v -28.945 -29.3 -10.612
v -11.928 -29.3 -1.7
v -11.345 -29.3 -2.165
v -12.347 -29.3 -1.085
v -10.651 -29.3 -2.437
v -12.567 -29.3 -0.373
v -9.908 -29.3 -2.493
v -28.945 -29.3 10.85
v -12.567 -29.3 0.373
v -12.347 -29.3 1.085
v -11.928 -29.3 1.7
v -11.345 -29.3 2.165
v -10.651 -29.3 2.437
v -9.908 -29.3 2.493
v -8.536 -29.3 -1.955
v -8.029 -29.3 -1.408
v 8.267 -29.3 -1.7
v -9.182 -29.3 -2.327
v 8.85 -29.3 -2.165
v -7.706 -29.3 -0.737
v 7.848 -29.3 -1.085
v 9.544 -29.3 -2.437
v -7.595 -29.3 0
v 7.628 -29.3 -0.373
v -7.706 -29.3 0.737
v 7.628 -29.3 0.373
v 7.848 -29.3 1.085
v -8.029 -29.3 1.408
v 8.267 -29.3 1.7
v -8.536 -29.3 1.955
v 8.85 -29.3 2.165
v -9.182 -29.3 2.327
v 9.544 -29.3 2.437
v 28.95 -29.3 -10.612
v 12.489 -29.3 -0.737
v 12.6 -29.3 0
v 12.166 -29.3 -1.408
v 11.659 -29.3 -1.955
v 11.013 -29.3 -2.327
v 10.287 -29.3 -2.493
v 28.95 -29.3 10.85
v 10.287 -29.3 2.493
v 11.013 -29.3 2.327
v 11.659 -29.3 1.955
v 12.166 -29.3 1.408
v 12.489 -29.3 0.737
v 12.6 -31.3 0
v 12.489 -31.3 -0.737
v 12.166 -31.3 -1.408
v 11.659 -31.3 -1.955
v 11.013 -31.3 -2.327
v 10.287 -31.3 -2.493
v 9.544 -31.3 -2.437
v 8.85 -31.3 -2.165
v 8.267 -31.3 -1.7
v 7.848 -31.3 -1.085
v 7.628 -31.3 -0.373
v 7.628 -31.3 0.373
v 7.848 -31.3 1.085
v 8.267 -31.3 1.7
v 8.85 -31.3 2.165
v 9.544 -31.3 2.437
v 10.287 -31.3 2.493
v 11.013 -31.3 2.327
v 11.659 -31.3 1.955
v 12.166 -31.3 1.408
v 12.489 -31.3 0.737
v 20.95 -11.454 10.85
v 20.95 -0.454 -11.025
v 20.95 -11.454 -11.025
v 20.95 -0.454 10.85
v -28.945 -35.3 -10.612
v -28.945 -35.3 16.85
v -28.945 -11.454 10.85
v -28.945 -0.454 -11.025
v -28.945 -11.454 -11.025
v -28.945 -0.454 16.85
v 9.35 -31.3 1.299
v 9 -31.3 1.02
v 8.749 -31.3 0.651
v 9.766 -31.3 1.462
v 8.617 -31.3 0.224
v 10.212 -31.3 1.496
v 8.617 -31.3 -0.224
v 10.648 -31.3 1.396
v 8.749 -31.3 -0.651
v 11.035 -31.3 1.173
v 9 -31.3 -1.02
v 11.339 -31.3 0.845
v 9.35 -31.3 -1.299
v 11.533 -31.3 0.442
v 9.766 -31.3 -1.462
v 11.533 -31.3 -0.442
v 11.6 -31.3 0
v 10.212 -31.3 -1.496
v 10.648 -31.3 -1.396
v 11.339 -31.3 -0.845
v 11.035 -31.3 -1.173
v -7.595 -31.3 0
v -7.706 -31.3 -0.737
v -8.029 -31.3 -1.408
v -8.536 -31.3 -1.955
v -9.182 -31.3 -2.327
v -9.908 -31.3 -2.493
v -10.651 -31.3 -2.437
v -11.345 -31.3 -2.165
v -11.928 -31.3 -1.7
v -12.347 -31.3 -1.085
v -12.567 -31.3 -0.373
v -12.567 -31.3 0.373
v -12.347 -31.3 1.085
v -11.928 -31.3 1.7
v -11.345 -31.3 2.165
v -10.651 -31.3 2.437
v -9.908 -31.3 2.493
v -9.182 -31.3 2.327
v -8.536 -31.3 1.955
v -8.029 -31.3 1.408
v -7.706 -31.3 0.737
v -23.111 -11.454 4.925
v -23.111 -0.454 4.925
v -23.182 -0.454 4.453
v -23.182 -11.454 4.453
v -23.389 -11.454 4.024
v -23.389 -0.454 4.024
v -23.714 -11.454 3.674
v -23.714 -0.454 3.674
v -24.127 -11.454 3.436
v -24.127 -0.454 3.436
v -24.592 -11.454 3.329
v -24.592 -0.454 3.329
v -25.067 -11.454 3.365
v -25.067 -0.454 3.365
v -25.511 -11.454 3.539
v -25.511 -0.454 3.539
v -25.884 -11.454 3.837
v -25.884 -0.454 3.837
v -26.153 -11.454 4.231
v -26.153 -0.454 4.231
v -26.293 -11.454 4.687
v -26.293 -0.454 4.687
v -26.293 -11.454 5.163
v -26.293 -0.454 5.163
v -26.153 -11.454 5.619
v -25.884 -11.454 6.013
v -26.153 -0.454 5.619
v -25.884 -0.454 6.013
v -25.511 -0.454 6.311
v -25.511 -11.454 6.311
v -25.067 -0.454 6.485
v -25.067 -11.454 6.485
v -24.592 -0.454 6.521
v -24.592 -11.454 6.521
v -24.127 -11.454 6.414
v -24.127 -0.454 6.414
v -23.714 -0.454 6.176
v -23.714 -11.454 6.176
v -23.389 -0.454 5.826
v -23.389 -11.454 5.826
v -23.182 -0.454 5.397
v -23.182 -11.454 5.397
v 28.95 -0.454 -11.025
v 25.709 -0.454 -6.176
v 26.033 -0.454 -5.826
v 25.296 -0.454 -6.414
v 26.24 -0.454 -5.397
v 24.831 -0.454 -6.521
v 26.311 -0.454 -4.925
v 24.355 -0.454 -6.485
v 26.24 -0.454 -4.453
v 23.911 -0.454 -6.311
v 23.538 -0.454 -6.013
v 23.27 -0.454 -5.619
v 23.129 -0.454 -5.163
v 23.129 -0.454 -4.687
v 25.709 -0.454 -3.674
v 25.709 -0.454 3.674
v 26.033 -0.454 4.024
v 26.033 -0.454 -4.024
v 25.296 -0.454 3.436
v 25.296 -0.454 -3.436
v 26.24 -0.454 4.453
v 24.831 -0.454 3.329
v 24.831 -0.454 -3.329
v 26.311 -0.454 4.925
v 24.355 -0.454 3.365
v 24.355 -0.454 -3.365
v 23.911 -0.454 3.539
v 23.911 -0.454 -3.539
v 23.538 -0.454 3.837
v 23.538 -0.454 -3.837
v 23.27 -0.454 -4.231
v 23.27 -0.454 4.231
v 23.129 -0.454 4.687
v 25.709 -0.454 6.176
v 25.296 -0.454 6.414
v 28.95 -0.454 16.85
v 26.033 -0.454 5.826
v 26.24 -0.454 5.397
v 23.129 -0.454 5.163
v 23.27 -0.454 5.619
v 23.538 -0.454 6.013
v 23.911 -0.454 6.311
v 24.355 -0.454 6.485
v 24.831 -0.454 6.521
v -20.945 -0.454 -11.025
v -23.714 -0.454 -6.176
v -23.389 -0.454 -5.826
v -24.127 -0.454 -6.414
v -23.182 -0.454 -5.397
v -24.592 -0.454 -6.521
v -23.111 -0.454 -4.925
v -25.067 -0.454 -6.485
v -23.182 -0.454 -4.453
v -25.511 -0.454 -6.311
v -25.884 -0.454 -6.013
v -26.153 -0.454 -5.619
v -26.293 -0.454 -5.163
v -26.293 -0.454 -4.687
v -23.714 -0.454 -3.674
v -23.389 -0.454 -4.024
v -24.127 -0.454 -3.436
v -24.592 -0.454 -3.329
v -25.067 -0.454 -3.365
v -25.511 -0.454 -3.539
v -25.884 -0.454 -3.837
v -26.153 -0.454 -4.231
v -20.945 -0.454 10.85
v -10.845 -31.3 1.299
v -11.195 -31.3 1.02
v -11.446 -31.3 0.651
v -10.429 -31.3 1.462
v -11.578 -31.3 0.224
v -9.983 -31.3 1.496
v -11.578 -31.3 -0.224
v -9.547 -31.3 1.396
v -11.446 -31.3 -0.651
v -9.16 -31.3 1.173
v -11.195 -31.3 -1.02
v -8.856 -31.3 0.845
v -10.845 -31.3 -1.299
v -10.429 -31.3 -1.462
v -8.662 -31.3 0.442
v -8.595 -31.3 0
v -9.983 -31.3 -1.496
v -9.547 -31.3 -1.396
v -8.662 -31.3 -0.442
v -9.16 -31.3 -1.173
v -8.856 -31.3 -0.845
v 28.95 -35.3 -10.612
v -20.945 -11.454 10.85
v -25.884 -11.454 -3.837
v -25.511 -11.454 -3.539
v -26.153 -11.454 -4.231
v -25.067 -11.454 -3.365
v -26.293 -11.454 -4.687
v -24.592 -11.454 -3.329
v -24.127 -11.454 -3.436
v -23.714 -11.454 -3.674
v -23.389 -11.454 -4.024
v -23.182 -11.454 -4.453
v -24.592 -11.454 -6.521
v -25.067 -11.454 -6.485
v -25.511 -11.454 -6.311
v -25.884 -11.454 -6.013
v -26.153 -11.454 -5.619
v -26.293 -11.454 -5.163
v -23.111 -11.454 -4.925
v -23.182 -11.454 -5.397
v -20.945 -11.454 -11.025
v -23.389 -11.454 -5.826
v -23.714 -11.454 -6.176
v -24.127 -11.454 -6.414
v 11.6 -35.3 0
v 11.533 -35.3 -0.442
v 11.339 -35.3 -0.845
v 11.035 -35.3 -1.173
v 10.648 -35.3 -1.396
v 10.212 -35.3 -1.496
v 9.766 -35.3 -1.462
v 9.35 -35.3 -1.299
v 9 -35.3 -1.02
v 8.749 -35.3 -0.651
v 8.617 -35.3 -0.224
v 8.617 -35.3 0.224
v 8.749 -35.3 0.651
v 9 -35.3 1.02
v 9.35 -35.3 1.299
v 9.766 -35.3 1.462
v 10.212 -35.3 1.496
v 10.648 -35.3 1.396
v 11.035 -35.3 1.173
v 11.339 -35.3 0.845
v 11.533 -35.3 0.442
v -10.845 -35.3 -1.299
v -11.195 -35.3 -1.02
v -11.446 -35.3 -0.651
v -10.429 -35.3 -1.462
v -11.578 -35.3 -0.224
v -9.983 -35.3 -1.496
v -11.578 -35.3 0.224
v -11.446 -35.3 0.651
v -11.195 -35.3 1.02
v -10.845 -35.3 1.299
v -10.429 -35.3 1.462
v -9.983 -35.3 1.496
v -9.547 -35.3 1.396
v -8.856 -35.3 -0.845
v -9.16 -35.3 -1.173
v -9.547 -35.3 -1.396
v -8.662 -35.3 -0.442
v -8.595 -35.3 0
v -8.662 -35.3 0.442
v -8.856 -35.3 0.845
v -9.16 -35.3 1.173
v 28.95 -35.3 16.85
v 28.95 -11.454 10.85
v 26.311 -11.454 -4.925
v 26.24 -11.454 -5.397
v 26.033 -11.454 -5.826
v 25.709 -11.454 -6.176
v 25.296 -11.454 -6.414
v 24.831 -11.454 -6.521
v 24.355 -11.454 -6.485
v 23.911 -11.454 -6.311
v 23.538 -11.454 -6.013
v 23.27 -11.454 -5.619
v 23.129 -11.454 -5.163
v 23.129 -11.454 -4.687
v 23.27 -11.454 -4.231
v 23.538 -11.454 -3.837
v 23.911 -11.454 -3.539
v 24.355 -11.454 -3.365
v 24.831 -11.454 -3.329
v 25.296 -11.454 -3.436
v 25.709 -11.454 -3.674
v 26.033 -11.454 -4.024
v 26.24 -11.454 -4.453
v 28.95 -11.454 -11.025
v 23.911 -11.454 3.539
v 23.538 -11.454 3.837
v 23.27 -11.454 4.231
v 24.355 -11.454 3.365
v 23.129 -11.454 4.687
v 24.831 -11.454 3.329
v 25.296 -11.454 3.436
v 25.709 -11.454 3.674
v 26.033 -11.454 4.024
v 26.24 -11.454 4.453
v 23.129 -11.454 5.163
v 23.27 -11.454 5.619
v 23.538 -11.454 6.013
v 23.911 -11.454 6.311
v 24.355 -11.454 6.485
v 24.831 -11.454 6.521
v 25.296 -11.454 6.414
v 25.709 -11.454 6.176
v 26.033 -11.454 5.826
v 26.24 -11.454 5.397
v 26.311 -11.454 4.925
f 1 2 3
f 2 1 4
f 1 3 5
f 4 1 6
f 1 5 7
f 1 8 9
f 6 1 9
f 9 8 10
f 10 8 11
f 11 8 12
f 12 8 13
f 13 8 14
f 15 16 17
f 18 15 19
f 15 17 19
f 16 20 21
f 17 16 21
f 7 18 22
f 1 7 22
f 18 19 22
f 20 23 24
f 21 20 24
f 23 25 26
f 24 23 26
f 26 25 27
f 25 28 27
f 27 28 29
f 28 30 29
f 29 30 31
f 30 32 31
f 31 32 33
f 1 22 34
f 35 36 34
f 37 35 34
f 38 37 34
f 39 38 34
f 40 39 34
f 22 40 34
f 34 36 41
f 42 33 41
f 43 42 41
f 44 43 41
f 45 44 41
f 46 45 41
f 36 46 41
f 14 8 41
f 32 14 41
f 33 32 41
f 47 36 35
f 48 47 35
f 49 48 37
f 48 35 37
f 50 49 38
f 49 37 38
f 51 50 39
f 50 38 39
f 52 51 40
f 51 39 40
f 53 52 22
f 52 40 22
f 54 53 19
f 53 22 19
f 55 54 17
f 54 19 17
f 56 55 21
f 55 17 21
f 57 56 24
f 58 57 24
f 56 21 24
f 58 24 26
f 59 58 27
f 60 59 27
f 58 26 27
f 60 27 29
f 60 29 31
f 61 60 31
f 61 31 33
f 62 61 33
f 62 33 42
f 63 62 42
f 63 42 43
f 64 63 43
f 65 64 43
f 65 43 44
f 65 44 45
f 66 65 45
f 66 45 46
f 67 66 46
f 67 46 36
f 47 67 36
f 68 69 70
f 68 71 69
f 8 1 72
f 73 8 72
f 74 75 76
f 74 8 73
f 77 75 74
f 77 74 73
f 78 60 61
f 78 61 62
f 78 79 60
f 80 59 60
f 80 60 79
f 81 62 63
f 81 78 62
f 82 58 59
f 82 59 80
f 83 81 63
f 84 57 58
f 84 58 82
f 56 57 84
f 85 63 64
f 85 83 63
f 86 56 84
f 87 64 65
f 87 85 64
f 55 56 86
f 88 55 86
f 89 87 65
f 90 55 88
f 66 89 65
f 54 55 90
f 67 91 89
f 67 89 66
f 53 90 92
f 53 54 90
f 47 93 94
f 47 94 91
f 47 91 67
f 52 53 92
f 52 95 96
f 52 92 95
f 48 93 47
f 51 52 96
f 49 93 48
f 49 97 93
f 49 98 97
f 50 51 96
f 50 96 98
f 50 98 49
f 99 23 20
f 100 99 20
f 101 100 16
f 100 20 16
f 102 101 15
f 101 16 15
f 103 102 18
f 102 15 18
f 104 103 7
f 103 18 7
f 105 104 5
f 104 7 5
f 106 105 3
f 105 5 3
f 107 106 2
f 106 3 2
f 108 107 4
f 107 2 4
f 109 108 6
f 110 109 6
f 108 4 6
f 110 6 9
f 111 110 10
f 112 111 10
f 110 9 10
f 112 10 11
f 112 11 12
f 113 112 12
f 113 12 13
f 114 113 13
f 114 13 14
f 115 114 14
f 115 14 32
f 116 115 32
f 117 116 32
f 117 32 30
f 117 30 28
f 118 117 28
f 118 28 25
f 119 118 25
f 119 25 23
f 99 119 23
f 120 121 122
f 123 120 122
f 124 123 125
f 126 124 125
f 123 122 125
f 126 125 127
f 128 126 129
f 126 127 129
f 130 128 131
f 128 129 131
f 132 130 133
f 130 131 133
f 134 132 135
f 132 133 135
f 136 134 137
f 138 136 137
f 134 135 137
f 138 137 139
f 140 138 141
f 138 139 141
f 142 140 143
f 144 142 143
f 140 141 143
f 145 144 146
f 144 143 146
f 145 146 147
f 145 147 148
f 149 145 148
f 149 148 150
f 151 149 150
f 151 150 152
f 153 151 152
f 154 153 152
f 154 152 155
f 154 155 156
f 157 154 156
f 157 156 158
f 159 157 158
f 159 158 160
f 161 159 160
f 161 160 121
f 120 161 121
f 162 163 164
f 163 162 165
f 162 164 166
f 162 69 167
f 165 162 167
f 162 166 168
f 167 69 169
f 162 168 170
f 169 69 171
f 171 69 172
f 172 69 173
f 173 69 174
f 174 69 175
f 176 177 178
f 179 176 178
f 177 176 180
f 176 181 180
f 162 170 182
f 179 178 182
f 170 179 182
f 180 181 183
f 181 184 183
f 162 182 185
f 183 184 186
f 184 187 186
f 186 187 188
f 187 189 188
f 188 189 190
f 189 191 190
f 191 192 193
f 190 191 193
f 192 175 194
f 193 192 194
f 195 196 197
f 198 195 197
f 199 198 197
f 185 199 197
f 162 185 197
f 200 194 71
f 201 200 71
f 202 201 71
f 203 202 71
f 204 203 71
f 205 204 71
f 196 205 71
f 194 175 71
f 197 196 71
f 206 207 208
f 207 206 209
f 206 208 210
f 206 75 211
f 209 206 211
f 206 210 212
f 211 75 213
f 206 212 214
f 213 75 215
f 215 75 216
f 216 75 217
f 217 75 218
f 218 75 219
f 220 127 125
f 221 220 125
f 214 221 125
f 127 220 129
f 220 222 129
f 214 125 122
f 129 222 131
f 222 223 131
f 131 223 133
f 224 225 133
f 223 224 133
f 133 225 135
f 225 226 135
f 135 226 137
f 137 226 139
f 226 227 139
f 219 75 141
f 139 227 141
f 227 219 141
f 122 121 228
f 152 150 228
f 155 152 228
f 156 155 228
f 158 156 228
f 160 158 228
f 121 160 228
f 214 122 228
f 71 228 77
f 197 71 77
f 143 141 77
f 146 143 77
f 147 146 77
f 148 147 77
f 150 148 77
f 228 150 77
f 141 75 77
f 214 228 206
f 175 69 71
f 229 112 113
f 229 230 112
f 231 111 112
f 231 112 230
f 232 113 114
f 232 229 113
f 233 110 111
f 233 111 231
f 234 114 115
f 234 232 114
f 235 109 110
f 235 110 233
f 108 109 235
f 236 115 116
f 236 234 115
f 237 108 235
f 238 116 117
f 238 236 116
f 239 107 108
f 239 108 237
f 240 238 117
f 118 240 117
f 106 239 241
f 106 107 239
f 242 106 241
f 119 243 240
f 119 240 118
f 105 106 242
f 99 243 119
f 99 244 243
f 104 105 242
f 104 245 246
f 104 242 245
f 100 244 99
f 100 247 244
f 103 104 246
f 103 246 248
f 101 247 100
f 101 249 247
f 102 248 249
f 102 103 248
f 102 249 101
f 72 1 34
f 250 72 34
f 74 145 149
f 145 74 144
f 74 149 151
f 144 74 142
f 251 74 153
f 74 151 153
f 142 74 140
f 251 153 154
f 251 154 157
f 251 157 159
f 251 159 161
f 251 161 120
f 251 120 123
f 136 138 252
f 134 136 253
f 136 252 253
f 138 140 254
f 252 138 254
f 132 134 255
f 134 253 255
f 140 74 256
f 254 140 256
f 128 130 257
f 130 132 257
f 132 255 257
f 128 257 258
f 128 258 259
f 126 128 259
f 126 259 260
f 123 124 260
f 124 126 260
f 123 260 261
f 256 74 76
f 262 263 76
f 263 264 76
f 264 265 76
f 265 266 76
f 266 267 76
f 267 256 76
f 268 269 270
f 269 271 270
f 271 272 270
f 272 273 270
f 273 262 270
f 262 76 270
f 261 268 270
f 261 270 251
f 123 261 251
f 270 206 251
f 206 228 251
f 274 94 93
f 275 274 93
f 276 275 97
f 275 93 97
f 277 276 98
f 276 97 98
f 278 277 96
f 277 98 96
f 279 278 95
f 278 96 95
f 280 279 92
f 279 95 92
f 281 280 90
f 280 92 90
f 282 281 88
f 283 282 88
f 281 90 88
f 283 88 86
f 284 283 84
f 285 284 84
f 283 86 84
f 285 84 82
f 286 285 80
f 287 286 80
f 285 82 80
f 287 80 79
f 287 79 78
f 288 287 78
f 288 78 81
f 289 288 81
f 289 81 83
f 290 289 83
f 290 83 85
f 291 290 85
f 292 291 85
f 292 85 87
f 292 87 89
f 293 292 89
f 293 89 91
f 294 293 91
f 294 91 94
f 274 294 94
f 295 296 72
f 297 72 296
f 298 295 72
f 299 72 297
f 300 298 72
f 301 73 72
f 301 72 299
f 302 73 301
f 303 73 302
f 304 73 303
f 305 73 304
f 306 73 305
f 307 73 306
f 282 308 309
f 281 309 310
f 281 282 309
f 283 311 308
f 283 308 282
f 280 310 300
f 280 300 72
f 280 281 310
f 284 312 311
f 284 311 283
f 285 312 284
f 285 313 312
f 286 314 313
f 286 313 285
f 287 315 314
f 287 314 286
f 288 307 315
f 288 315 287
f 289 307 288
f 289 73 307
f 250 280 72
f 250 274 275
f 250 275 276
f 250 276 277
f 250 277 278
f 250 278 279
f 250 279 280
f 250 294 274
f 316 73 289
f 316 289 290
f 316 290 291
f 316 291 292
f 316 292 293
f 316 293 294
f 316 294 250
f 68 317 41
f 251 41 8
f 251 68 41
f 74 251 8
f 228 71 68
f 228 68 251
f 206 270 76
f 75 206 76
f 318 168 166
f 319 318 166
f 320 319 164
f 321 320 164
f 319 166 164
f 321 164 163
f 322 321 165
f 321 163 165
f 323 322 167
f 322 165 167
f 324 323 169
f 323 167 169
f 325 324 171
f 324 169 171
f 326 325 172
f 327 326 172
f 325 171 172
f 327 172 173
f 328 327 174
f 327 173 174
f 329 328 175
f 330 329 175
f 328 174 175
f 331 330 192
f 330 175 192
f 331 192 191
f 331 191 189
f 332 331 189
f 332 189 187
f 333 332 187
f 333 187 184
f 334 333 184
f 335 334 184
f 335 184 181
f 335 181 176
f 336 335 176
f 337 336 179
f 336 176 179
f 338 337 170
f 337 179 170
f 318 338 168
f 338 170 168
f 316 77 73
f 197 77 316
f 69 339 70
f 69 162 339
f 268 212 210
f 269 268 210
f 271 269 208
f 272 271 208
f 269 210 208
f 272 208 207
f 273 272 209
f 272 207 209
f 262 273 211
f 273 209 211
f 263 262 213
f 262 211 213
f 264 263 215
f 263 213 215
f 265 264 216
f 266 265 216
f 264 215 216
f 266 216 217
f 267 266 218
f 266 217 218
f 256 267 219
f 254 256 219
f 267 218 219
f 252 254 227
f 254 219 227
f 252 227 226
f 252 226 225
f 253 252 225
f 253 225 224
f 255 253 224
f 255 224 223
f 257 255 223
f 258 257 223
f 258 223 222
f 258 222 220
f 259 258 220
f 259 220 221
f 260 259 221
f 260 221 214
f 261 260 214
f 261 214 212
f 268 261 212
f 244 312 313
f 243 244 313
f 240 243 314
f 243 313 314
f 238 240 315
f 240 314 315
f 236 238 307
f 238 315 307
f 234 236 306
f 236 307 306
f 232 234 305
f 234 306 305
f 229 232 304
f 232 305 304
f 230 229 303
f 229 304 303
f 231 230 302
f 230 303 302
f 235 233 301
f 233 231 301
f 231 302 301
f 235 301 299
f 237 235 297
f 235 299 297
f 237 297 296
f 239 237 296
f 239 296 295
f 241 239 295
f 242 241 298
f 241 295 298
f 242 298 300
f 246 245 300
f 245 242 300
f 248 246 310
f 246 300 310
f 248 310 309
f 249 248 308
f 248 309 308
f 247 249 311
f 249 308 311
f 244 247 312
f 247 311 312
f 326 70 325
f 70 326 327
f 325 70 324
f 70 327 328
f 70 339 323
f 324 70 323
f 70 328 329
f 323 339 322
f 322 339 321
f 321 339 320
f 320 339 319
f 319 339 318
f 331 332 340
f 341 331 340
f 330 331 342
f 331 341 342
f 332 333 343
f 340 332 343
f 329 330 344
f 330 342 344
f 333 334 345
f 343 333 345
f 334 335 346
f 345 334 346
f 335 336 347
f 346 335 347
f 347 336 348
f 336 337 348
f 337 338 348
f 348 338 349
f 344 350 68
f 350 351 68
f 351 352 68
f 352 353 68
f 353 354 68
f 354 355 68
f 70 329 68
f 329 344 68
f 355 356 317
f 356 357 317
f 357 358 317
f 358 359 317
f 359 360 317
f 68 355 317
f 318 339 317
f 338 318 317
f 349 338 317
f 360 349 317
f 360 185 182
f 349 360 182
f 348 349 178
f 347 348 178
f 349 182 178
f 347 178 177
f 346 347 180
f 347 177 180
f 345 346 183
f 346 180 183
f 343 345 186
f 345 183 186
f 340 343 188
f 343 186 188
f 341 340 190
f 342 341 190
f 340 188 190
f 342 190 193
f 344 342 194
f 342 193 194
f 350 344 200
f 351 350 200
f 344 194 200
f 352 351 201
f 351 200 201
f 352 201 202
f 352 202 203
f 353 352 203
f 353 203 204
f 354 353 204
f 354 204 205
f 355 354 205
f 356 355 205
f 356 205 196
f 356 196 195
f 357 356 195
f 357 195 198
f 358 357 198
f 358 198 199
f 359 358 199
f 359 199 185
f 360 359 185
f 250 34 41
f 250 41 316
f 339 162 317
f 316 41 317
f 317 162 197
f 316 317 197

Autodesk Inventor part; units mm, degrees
ref_plane "Work Plane1" through (-19.25, -0.5, 9.85) normal (0, 0, 1) x (1, 0, 0)
sketch "Sketch1" plane through (-19.25, -0.5, 9.85) normal (0, 0, 1) x (1, 0, 0)
  line L0 (-0.695, -27.8) -> (39.2, -27.8)
  line L1 (39.2, -27.8) -> (39.2, 8.9608)
  line L2 (39.2, 8.9608) -> (-0.695, 8.9608)
  line L3 (-0.695, 8.9608) -> (-0.695, -27.8)
  point P0 (19.25, 0.5)
extrude "Extrusion1" add sketch "Sketch1" along normal blind 3
ref_plane "Work Plane2" through (-19.25, -0.5, 12.85) normal (0, 0, 1) x (1, 0, 0)
sketch "Sketch2" plane through (-19.25, -0.5, 12.85) normal (0, 0, 1) x (1, 0, 0)
  line L0 (39.2, -27.8) -> (39.2, 8.9608) projected
  line L1 (39.2, -27.8) -> (-0.695, -27.8)
  line L2 (-0.695, -27.8) -> (-0.695, 8.9608)
  line L3 (-0.695, 8.9608) -> (39.2, 8.9608)
  line L4 (39.2, 8.9608) -> (39.2, -27.8)
  point P0 (19.25, 0.5)
  point P1 (39.2, 8.9608)
extrude "Extrusion2" add sketch "Sketch2" along normal blind 5
ref_plane "Work Plane4" through (19.95, -28.3, 9.85) normal (1, 0, 0) x (0, 0, -1)
sketch "Sketch3" plane through (19.95, -28.3, 9.85) normal (1, 0, 0) x (0, 0, -1)
  line L0 (0, 0) -> (0, 36.7608) projected
  line L1 (0, 0) -> (-8, 0) projected
  line L2 (0, 36.7608) -> (-2, 36.7608)
  line L3 (-2, 36.7608) -> (-2, 0)
  line L4 (-2, 0) -> (0, 0)
  line L5 (0, 0) -> (0, 36.7608)
  point P0 (9.85, 28.3)
  dimension "d4" = 2
extrude "Extrusion3" cut sketch "Sketch3" against normal blind 50
ref_plane "Work Plane3" through (19.95, -28.3, 17.85) normal (1, 0, 0) x (0, 0, -1)
sketch "Sketch4" plane through (19.95, -28.3, 17.85) normal (1, 0, 0) x (0, 0, -1)
  line L0 (6, 0) -> (0, 0) projected
  line L1 (6, 36.7608) -> (0, 36.7608) projected
  line L2 (0, 0) -> (1, 0)
  line L3 (1, 0) -> (1, 36.7608)
  line L4 (1, 36.7608) -> (0, 36.7608)
  line L5 (0, 36.7608) -> (0, 0)
  point P0 (17.85, 28.3)
  point P1 (1, 0)
  dimension "d7" = 1
extrude "Extrusion4" cut sketch "Sketch4" against normal blind 50
ref_plane "Work Plane5" through (19.95, -28.3, 11.85) normal (1, 0, 0) x (0, 0, -1)
sketch "Sketch5" plane through (19.95, -28.3, 11.85) normal (1, 0, 0) x (0, 0, -1)
  line L0 (-5, 36.7608) -> (-5, 0) projected
  line L1 (0, 0) -> (0, 36.7608) projected
  line L2 (-5, 36.7608) -> (0, 36.7608)
  line L3 (0, 36.7608) -> (0, 0)
  line L4 (0, 0) -> (-5, 0)
  line L5 (-5, 0) -> (-5, 36.7608)
  point P0 (11.85, 28.3)
extrude "Extrusion5" add sketch "Sketch5" along normal blind 7
ref_plane "Work Plane6" through (-19.945, -28.3, 11.85) normal (0, 0, -1) x (-1, 0, 0)
sketch "Sketch6" plane through (-19.945, -28.3, 11.85) normal (0, 0, -1) x (-1, 0, 0)
  line L0 (-46.895, 0) -> (-46.895, 36.7608) projected
  line L1 (-46.895, 27.8459) -> (-40.895, 27.8459)
  line L2 (-40.895, 27.8459) -> (-40.895, 11.8459)
  line L3 (-40.895, 11.8459) -> (-46.895, 11.8459)
  line L4 (-46.895, 11.8459) -> (-46.895, 27.8459)
  point P0 (-19.945, 28.3)
  dimension "d12" = 6
  dimension "d13" = 16
extrude "Extrusion6" add sketch "Sketch6" along normal blind 22.875
sketch "Sketch7" plane through (20.95, -0.4541, 11.85) normal (0, 1, 0) x (1, 0, 0)
  arc A0 (5.4164, 8.2173) -> (5.4164, 5.6327) centre (3.7611, 6.925) ccw projected
  circle A1 centre (3.7611, 6.925) radius 2.5
  arc A2 (5.4164, 18.0673) -> (5.4164, 15.4827) centre (3.7611, 16.775) ccw projected
  circle A3 centre (3.7611, 16.775) radius 2.5
  point P0 (-20.95, 11.85)
  dimension "d16" = 5
  dimension "d17" = 5
extrude "Extrusion7" cut sketch "Sketch7" against normal blind 22.875
ref_plane "Work Plane7" through (26.95, -28.3, 11.85) normal (1, 0, 0) x (0, 0, -1)
sketch "Sketch8" plane through (26.95, -28.3, 11.85) normal (1, 0, 0) x (0, 0, -1)
  line L0 (0, 11.8459) -> (22.875, 11.8459) projected
  line L1 (22.875, 27.8459) -> (22.875, 11.8459) projected
  line L2 (0, 11.8459) -> (22.875, 11.8459)
  line L3 (22.875, 11.8459) -> (22.875, 16.8459)
  line L4 (22.875, 16.8459) -> (0, 16.8459)
  line L5 (0, 16.8459) -> (0, 11.8459)
  point P0 (11.85, 28.3)
  dimension "d20" = 5
extrude "Extrusion8" cut sketch "Sketch8" against normal blind 6.7
ref_plane "Work Plane8" through (-19.945, -28.3, 11.85) normal (-1, 0, 0) x (0, 0, 1)
sketch "Sketch9" plane through (-19.945, -28.3, 11.85) normal (-1, 0, 0) x (0, 0, 1)
  line L0 (0, 36.7608) -> (0, 0) projected
  line L1 (5, 0) -> (0, 0) projected
  line L2 (0, 36.7608) -> (5, 36.7608)
  line L3 (5, 36.7608) -> (5, 0)
  line L4 (5, 0) -> (0, 0)
  line L5 (0, 0) -> (0, 36.7608)
  point P0 (-11.85, 28.3)
extrude "Extrusion9" add sketch "Sketch9" along normal blind 7
ref_plane "Work Plane10" through (26.95, -0.4541, 11.85) normal (0, 0, -1) x (-1, 0, 0)
sketch "Sketch11" plane through (26.95, -0.4541, 11.85) normal (0, 0, -1) x (-1, 0, 0)
  line L0 (53.895, -27.8459) -> (53.895, 8.9148) projected
  line L1 (53.895, 0) -> (47.895, 0)
  line L2 (47.895, 0) -> (47.895, -11)
  line L3 (47.895, -11) -> (53.895, -11)
  line L4 (53.895, -11) -> (53.895, 0)
  point P0 (26.95, 0.4541)
  dimension "d25" = 6
extrude "Extrusion10" add sketch "Sketch11" along normal blind 22.875
sketch "Sketch12" plane through (-26.945, -0.4541, 11.85) normal (0, 1, 0) x (1, 0, 0)
  arc A0 (0.5786, 15.4827) -> (0.5786, 18.0673) centre (2.2339, 16.775) ccw projected
  circle A1 centre (2.2339, 16.775) radius 2.5
  arc A2 (0.5786, 5.6327) -> (0.5786, 8.2173) centre (2.2339, 6.925) ccw projected
  circle A3 centre (2.2339, 6.925) radius 2.5
  point P0 (26.945, 11.85)
  dimension "d28" = 5
  dimension "d29" = 5
extrude "Extrusion11" cut sketch "Sketch12" against normal blind 22.875
ref_plane "Work Plane11" through (-26.945, -28.3, 11.85) normal (-1, 0, 0) x (0, 0, 1)
sketch "Sketch13" plane through (-26.945, -28.3, 11.85) normal (-1, 0, 0) x (0, 0, 1)
  line L0 (0, 16.8459) -> (0, 27.8459) projected
  line L1 (5, 36.7608) -> (0, 36.7608) projected
  line L2 (0, 27.8459) -> (5, 27.8459)
  line L3 (5, 27.8459) -> (5, 36.7608)
  line L4 (5, 36.7608) -> (0, 36.7608)
  line L5 (0, 36.7608) -> (0, 27.8459)
  point P0 (-11.85, 28.3)
extrude "Extrusion12" cut sketch "Sketch13" against normal blind 67.325
ref_plane "Work Plane9" through (26.95, -28.3, 11.85) normal (0, -1, 0) x (1, 0, 0)
sketch "Sketch14" plane through (26.95, -28.3, 11.85) normal (0, -1, 0) x (1, 0, 0)
  line L0 (0, 5) -> (0, 0) projected
  line L1 (0, 5) -> (-53.895, 5) projected
  line L2 (0, 0) -> (-53.895, 0)
  line L3 (-53.895, 0) -> (-53.895, 5)
  line L4 (-53.895, 5) -> (0, 5)
  line L5 (0, 5) -> (0, 0)
  point P0 (-26.95, -11.85)
extrude "Extrusion13" add sketch "Sketch14" along normal blind 5
ref_plane "Work Plane12" through (26.95, -11.4541, 11.85) normal (0, 0, -1) x (-1, 0, 0)
sketch "Sketch15" plane through (26.95, -11.4541, 11.85) normal (0, 0, -1) x (-1, 0, 0)
  line L0 (53.895, -21.8459) -> (0, -21.8459) projected
  line L1 (53.895, 11) -> (53.895, -21.8459) projected
  line L2 (0, -21.8459) -> (53.895, -21.8459)
  line L3 (53.895, -21.8459) -> (53.895, -17.8459)
  line L4 (53.895, -17.8459) -> (0, -17.8459)
  line L5 (0, -17.8459) -> (0, -21.8459)
  point P0 (26.95, 11.4541)
  dimension "d36" = 4
extrude "Extrusion14" add sketch "Sketch15" along normal blind 22.4625
ref_plane "Work Plane13" through (-26.945, -29.3, 11.85) normal (0, 1, 0) x (1, 0, 0)
sketch "Sketch16" plane through (-26.945, -29.3, 11.85) normal (0, 1, 0) x (1, 0, 0)
  line L0 (53.895, 0) -> (53.895, 22.4625) projected
  line L1 (0, 0) -> (0, 22.4625) projected
  line L2 (53.895, 0) -> (0, 0)
  line L3 (0, 0) -> (0, 1)
  line L4 (0, 1) -> (53.895, 1)
  line L5 (53.895, 1) -> (53.895, 0)
  point P0 (26.945, 11.85)
  point P1 (53.895, 1)
  dimension "d39" = 1
extrude "Extrusion15" add sketch "Sketch16" along normal blind 30
ref_plane "Work Plane14" through (26.95, -28.3, 11.85) normal (1, 0, 0) x (0, 0, -1)
sketch "Sketch17" plane through (26.95, -28.3, 11.85) normal (1, 0, 0) x (0, 0, -1)
  line L0 (0, 29) -> (1, 29) projected
  line L1 (5.8126, 27.8459) -> (1, 27.8459) projected
  line L2 (0, 29) -> (1, 29)
  line L3 (1, 29) -> (1, 27.8459)
  line L4 (1, 27.8459) -> (0, 27.8459)
  line L5 (0, 27.8459) -> (0, 29)
  point P0 (11.85, 28.3)
extrude "Extrusion16" cut sketch "Sketch17" against normal blind 100
sketch "Sketch19" plane through (26.95, -33.3, 11.85) normal (0, -1, 0) x (1, 0, 0)
  circle A0 centre (-16.85, -11.85) radius 5
  circle A1 centre (-16.85, -11.85) radius 1.5
  point P0 (-26.95, -11.85)
  dimension "d47" = 10
  dimension "d50" = 3
extrude "Extrusion20" cut sketch "Sketch19" against normal blind 10 contours A1
sketch "Sketch20" plane through (26.95, -33.3, 11.85) normal (0, -1, 0) x (1, 0, 0)
  line L0 (-53.895, -22.4625) -> (0, -22.4625) projected
  line L1 (-53.895, 5) -> (-53.895, -22.4625) projected
  line L2 (0, -22.4625) -> (-53.895, -22.4625)
  line L3 (-53.895, -22.4625) -> (-53.895, 5)
  line L4 (-53.895, 5) -> (0, 5)
  line L5 (0, 5) -> (0, -22.4625)
  point P0 (-26.95, -11.85)
extrude "Extrusion21" add sketch "Sketch20" along normal blind 2
sketch "Sketch21" plane through (-26.945, -29.3, -10.6125) normal (0, 1, 0) x (1, 0, 0)
  circle A0 centre (37.045, -10.6125) radius 1.5 projected
  circle A1 centre (37.045, -10.6125) radius 1.5
  point P0 (26.945, -10.6125)
extrude "Extrusion22" cut sketch "Sketch21" against normal blind 10
sketch "Sketch22" plane through (-26.945, -29.3, -10.6125) normal (0, 1, 0) x (1, 0, 0)
  circle A0 centre (37.045, -10.6125) radius 1.5 projected
  circle A1 centre (37.045, -10.6125) radius 2.5
  point P0 (26.945, -10.6125)
  dimension "d59" = 5
extrude "Extrusion23" cut sketch "Sketch22" against normal blind 2
sketch "Sketch23" plane through (-19.945, -28.3, -11.025) normal (0, 0, -1) x (-1, 0, 0)
  line L0 (-46.895, 27.8459) -> (-46.895, 16.8459) projected
  line L1 (-46.895, 27.8459) -> (-48.895, 27.8459)
  line L2 (-48.895, 27.8459) -> (-48.895, 16.8459)
  line L3 (-48.895, 16.8459) -> (-46.895, 16.8459)
  line L4 (-46.895, 16.8459) -> (-46.895, 27.8459)
  line L5 (7, 16.8459) -> (7, 27.8459) projected
  line L6 (7, 27.8459) -> (9, 27.8459)
  line L7 (9, 27.8459) -> (9, 16.8459)
  line L8 (9, 16.8459) -> (7, 16.8459)
  line L9 (7, 16.8459) -> (7, 27.8459)
  point P0 (-19.945, 28.3)
  dimension "d62" = 2
  dimension "d63" = 2
extrude "Extrusion24" add sketch "Sketch23" against normal up to surface (27.875 mm away)
sketch "Sketch24" plane through (-20.945, -0.4541, 10.85) normal (0, 1, 0) x (1, 0, 0)
  arc A0 (47.895, 7.0374) -> (47.895, 4.8126) centre (45.6561, 5.925) ccw projected
  circle A1 centre (45.6561, 5.925) radius 1.6
  arc A2 (47.895, 16.8874) -> (47.895, 14.6626) centre (45.6561, 15.775) ccw projected
  circle A3 centre (45.6561, 15.775) radius 1.6
  circle A4 centre (45.6561, 5.925) radius 2.5
  circle A5 centre (45.6561, 15.775) radius 2.5
  point P0 (20.945, 10.85)
  point P1 (47.895, 4.8126)
  dimension "d66" = 3.2
  dimension "d67" = 3.2
extrude "Extrusion25" add sketch "Sketch24" against normal up to surface (11 mm away)
sketch "Sketch25" plane through (-20.945, -0.4541, 10.85) normal (0, 1, 0) x (1, 0, 0)
  arc A0 (-6, 4.8025) -> (-6, 7.0475) centre (-3.7661, 5.925) ccw projected
  circle A1 centre (-3.7661, 5.925) radius 1.6
  arc A2 (-6, 14.6525) -> (-6, 16.8975) centre (-3.7661, 15.775) ccw projected
  circle A3 centre (-3.7661, 15.775) radius 1.6
  circle A4 centre (-3.7661, 15.775) radius 2.5
  circle A5 centre (-3.7661, 5.925) radius 2.5
  point P0 (20.945, 10.85)
  point P1 (-6, 7.0475)
  dimension "d70" = 3.2
  dimension "d71" = 3.2
  dimension "d72" = 5
  dimension "d73" = 5
extrude "Extrusion26" add sketch "Sketch25" against normal up to surface (11 mm away)
sketch "Sketch26" plane through (26.95, -35.3, 11.85) normal (0, -1, 0) x (1, 0, 0)
  line L0 (-55.895, -22.875) -> (-55.895, 5) projected
  line L1 (-55.895, -11.85) -> (-37.045, -11.85)
  line L2 (-55.895, -11.85) -> (-37.045, -11.85) construction
  circle A0 centre (-37.045, -11.85) radius 1.5
  point P0 (-26.95, -11.85)
  dimension "d76" = 18.85
  dimension "d77" = 0
  dimension "d78" = 3
extrude "Extrusion27" cut sketch "Sketch26" against normal blind 10
sketch "Sketch27" plane through (-26.945, -29.3, -10.6125) normal (0, 1, 0) x (1, 0, 0)
  circle A0 centre (16.85, -10.6125) radius 1.5 projected
  circle A1 centre (16.85, -10.6125) radius 2.5
  point P0 (26.945, -10.6125)
  dimension "d81" = 5
extrude "Extrusion28" cut sketch "Sketch27" against normal up to surface (2 mm away)
sketch "Sketch28" plane through (-26.945, -35.3, 16.85) normal (0, 0, 1) x (1, 0, 0)
  line L0 (0, 0) -> (53.895, 0) projected
  line L1 (26.9475, 0) -> (26.9475, 34.8459)
  line L2 (6, 34.8459) -> (47.895, 34.8459) projected
  point P0 (26.945, 35.3)
sketch "Sketch29" plane through (-26.945, -11.4541, 10.85) normal (0, -1, 0) x (1, 0, 0)
  line L0 (6, 0) -> (0, 0) projected
  line L1 (-2, 6) -> (0, 6) projected
  line L2 (0, 0) -> (-2, 0)
  line L3 (-2, 0) -> (-2, 6)
  line L4 (-2, 6) -> (0, 6)
  line L5 (0, 6) -> (0, 0)
  line L6 (53.895, 0) -> (53.895, 6) projected
  line L7 (55.895, -21.875) -> (55.895, 6) projected
  line L8 (53.895, 0) -> (55.895, 0)
  line L9 (55.895, 0) -> (55.895, 6)
  line L10 (55.895, 6) -> (53.895, 6)
  line L11 (53.895, 6) -> (53.895, 0)
  point P0 (26.945, -10.85)
extrude "Extrusion29" add sketch "Sketch29" along normal up to surface (23.8459 mm away)
sketch "Sketch30" plane through (26.95, -29.3, 10.85) normal (0, 0, -1) x (-1, 0, 0)
  line L0 (53.895, 0) -> (0, 0) projected
  line L1 (-2, -6) -> (0, -6) projected
  line L2 (0, 0) -> (-2, 0)
  line L3 (-2, 0) -> (-2, -6)
  line L4 (-2, -6) -> (0, -6)
  line L5 (0, -6) -> (0, 0)
  line L6 (55.895, -6) -> (-2, -6) projected
  line L7 (55.895, 17.8459) -> (55.895, -6) projected
  line L8 (53.895, -6) -> (55.895, -6)
  line L9 (55.895, -6) -> (55.895, 0)
  line L10 (55.895, 0) -> (53.895, 0)
  line L11 (53.895, 0) -> (53.895, -6)
  point P0 (26.95, 29.3)
extrude "Extrusion30" add sketch "Sketch30" along normal up to surface (21.4625 mm away) contours L10 L7 L6 L11 | L5 L1 L3 L2
properties part number "MG996RServoHolder" material "钢"
